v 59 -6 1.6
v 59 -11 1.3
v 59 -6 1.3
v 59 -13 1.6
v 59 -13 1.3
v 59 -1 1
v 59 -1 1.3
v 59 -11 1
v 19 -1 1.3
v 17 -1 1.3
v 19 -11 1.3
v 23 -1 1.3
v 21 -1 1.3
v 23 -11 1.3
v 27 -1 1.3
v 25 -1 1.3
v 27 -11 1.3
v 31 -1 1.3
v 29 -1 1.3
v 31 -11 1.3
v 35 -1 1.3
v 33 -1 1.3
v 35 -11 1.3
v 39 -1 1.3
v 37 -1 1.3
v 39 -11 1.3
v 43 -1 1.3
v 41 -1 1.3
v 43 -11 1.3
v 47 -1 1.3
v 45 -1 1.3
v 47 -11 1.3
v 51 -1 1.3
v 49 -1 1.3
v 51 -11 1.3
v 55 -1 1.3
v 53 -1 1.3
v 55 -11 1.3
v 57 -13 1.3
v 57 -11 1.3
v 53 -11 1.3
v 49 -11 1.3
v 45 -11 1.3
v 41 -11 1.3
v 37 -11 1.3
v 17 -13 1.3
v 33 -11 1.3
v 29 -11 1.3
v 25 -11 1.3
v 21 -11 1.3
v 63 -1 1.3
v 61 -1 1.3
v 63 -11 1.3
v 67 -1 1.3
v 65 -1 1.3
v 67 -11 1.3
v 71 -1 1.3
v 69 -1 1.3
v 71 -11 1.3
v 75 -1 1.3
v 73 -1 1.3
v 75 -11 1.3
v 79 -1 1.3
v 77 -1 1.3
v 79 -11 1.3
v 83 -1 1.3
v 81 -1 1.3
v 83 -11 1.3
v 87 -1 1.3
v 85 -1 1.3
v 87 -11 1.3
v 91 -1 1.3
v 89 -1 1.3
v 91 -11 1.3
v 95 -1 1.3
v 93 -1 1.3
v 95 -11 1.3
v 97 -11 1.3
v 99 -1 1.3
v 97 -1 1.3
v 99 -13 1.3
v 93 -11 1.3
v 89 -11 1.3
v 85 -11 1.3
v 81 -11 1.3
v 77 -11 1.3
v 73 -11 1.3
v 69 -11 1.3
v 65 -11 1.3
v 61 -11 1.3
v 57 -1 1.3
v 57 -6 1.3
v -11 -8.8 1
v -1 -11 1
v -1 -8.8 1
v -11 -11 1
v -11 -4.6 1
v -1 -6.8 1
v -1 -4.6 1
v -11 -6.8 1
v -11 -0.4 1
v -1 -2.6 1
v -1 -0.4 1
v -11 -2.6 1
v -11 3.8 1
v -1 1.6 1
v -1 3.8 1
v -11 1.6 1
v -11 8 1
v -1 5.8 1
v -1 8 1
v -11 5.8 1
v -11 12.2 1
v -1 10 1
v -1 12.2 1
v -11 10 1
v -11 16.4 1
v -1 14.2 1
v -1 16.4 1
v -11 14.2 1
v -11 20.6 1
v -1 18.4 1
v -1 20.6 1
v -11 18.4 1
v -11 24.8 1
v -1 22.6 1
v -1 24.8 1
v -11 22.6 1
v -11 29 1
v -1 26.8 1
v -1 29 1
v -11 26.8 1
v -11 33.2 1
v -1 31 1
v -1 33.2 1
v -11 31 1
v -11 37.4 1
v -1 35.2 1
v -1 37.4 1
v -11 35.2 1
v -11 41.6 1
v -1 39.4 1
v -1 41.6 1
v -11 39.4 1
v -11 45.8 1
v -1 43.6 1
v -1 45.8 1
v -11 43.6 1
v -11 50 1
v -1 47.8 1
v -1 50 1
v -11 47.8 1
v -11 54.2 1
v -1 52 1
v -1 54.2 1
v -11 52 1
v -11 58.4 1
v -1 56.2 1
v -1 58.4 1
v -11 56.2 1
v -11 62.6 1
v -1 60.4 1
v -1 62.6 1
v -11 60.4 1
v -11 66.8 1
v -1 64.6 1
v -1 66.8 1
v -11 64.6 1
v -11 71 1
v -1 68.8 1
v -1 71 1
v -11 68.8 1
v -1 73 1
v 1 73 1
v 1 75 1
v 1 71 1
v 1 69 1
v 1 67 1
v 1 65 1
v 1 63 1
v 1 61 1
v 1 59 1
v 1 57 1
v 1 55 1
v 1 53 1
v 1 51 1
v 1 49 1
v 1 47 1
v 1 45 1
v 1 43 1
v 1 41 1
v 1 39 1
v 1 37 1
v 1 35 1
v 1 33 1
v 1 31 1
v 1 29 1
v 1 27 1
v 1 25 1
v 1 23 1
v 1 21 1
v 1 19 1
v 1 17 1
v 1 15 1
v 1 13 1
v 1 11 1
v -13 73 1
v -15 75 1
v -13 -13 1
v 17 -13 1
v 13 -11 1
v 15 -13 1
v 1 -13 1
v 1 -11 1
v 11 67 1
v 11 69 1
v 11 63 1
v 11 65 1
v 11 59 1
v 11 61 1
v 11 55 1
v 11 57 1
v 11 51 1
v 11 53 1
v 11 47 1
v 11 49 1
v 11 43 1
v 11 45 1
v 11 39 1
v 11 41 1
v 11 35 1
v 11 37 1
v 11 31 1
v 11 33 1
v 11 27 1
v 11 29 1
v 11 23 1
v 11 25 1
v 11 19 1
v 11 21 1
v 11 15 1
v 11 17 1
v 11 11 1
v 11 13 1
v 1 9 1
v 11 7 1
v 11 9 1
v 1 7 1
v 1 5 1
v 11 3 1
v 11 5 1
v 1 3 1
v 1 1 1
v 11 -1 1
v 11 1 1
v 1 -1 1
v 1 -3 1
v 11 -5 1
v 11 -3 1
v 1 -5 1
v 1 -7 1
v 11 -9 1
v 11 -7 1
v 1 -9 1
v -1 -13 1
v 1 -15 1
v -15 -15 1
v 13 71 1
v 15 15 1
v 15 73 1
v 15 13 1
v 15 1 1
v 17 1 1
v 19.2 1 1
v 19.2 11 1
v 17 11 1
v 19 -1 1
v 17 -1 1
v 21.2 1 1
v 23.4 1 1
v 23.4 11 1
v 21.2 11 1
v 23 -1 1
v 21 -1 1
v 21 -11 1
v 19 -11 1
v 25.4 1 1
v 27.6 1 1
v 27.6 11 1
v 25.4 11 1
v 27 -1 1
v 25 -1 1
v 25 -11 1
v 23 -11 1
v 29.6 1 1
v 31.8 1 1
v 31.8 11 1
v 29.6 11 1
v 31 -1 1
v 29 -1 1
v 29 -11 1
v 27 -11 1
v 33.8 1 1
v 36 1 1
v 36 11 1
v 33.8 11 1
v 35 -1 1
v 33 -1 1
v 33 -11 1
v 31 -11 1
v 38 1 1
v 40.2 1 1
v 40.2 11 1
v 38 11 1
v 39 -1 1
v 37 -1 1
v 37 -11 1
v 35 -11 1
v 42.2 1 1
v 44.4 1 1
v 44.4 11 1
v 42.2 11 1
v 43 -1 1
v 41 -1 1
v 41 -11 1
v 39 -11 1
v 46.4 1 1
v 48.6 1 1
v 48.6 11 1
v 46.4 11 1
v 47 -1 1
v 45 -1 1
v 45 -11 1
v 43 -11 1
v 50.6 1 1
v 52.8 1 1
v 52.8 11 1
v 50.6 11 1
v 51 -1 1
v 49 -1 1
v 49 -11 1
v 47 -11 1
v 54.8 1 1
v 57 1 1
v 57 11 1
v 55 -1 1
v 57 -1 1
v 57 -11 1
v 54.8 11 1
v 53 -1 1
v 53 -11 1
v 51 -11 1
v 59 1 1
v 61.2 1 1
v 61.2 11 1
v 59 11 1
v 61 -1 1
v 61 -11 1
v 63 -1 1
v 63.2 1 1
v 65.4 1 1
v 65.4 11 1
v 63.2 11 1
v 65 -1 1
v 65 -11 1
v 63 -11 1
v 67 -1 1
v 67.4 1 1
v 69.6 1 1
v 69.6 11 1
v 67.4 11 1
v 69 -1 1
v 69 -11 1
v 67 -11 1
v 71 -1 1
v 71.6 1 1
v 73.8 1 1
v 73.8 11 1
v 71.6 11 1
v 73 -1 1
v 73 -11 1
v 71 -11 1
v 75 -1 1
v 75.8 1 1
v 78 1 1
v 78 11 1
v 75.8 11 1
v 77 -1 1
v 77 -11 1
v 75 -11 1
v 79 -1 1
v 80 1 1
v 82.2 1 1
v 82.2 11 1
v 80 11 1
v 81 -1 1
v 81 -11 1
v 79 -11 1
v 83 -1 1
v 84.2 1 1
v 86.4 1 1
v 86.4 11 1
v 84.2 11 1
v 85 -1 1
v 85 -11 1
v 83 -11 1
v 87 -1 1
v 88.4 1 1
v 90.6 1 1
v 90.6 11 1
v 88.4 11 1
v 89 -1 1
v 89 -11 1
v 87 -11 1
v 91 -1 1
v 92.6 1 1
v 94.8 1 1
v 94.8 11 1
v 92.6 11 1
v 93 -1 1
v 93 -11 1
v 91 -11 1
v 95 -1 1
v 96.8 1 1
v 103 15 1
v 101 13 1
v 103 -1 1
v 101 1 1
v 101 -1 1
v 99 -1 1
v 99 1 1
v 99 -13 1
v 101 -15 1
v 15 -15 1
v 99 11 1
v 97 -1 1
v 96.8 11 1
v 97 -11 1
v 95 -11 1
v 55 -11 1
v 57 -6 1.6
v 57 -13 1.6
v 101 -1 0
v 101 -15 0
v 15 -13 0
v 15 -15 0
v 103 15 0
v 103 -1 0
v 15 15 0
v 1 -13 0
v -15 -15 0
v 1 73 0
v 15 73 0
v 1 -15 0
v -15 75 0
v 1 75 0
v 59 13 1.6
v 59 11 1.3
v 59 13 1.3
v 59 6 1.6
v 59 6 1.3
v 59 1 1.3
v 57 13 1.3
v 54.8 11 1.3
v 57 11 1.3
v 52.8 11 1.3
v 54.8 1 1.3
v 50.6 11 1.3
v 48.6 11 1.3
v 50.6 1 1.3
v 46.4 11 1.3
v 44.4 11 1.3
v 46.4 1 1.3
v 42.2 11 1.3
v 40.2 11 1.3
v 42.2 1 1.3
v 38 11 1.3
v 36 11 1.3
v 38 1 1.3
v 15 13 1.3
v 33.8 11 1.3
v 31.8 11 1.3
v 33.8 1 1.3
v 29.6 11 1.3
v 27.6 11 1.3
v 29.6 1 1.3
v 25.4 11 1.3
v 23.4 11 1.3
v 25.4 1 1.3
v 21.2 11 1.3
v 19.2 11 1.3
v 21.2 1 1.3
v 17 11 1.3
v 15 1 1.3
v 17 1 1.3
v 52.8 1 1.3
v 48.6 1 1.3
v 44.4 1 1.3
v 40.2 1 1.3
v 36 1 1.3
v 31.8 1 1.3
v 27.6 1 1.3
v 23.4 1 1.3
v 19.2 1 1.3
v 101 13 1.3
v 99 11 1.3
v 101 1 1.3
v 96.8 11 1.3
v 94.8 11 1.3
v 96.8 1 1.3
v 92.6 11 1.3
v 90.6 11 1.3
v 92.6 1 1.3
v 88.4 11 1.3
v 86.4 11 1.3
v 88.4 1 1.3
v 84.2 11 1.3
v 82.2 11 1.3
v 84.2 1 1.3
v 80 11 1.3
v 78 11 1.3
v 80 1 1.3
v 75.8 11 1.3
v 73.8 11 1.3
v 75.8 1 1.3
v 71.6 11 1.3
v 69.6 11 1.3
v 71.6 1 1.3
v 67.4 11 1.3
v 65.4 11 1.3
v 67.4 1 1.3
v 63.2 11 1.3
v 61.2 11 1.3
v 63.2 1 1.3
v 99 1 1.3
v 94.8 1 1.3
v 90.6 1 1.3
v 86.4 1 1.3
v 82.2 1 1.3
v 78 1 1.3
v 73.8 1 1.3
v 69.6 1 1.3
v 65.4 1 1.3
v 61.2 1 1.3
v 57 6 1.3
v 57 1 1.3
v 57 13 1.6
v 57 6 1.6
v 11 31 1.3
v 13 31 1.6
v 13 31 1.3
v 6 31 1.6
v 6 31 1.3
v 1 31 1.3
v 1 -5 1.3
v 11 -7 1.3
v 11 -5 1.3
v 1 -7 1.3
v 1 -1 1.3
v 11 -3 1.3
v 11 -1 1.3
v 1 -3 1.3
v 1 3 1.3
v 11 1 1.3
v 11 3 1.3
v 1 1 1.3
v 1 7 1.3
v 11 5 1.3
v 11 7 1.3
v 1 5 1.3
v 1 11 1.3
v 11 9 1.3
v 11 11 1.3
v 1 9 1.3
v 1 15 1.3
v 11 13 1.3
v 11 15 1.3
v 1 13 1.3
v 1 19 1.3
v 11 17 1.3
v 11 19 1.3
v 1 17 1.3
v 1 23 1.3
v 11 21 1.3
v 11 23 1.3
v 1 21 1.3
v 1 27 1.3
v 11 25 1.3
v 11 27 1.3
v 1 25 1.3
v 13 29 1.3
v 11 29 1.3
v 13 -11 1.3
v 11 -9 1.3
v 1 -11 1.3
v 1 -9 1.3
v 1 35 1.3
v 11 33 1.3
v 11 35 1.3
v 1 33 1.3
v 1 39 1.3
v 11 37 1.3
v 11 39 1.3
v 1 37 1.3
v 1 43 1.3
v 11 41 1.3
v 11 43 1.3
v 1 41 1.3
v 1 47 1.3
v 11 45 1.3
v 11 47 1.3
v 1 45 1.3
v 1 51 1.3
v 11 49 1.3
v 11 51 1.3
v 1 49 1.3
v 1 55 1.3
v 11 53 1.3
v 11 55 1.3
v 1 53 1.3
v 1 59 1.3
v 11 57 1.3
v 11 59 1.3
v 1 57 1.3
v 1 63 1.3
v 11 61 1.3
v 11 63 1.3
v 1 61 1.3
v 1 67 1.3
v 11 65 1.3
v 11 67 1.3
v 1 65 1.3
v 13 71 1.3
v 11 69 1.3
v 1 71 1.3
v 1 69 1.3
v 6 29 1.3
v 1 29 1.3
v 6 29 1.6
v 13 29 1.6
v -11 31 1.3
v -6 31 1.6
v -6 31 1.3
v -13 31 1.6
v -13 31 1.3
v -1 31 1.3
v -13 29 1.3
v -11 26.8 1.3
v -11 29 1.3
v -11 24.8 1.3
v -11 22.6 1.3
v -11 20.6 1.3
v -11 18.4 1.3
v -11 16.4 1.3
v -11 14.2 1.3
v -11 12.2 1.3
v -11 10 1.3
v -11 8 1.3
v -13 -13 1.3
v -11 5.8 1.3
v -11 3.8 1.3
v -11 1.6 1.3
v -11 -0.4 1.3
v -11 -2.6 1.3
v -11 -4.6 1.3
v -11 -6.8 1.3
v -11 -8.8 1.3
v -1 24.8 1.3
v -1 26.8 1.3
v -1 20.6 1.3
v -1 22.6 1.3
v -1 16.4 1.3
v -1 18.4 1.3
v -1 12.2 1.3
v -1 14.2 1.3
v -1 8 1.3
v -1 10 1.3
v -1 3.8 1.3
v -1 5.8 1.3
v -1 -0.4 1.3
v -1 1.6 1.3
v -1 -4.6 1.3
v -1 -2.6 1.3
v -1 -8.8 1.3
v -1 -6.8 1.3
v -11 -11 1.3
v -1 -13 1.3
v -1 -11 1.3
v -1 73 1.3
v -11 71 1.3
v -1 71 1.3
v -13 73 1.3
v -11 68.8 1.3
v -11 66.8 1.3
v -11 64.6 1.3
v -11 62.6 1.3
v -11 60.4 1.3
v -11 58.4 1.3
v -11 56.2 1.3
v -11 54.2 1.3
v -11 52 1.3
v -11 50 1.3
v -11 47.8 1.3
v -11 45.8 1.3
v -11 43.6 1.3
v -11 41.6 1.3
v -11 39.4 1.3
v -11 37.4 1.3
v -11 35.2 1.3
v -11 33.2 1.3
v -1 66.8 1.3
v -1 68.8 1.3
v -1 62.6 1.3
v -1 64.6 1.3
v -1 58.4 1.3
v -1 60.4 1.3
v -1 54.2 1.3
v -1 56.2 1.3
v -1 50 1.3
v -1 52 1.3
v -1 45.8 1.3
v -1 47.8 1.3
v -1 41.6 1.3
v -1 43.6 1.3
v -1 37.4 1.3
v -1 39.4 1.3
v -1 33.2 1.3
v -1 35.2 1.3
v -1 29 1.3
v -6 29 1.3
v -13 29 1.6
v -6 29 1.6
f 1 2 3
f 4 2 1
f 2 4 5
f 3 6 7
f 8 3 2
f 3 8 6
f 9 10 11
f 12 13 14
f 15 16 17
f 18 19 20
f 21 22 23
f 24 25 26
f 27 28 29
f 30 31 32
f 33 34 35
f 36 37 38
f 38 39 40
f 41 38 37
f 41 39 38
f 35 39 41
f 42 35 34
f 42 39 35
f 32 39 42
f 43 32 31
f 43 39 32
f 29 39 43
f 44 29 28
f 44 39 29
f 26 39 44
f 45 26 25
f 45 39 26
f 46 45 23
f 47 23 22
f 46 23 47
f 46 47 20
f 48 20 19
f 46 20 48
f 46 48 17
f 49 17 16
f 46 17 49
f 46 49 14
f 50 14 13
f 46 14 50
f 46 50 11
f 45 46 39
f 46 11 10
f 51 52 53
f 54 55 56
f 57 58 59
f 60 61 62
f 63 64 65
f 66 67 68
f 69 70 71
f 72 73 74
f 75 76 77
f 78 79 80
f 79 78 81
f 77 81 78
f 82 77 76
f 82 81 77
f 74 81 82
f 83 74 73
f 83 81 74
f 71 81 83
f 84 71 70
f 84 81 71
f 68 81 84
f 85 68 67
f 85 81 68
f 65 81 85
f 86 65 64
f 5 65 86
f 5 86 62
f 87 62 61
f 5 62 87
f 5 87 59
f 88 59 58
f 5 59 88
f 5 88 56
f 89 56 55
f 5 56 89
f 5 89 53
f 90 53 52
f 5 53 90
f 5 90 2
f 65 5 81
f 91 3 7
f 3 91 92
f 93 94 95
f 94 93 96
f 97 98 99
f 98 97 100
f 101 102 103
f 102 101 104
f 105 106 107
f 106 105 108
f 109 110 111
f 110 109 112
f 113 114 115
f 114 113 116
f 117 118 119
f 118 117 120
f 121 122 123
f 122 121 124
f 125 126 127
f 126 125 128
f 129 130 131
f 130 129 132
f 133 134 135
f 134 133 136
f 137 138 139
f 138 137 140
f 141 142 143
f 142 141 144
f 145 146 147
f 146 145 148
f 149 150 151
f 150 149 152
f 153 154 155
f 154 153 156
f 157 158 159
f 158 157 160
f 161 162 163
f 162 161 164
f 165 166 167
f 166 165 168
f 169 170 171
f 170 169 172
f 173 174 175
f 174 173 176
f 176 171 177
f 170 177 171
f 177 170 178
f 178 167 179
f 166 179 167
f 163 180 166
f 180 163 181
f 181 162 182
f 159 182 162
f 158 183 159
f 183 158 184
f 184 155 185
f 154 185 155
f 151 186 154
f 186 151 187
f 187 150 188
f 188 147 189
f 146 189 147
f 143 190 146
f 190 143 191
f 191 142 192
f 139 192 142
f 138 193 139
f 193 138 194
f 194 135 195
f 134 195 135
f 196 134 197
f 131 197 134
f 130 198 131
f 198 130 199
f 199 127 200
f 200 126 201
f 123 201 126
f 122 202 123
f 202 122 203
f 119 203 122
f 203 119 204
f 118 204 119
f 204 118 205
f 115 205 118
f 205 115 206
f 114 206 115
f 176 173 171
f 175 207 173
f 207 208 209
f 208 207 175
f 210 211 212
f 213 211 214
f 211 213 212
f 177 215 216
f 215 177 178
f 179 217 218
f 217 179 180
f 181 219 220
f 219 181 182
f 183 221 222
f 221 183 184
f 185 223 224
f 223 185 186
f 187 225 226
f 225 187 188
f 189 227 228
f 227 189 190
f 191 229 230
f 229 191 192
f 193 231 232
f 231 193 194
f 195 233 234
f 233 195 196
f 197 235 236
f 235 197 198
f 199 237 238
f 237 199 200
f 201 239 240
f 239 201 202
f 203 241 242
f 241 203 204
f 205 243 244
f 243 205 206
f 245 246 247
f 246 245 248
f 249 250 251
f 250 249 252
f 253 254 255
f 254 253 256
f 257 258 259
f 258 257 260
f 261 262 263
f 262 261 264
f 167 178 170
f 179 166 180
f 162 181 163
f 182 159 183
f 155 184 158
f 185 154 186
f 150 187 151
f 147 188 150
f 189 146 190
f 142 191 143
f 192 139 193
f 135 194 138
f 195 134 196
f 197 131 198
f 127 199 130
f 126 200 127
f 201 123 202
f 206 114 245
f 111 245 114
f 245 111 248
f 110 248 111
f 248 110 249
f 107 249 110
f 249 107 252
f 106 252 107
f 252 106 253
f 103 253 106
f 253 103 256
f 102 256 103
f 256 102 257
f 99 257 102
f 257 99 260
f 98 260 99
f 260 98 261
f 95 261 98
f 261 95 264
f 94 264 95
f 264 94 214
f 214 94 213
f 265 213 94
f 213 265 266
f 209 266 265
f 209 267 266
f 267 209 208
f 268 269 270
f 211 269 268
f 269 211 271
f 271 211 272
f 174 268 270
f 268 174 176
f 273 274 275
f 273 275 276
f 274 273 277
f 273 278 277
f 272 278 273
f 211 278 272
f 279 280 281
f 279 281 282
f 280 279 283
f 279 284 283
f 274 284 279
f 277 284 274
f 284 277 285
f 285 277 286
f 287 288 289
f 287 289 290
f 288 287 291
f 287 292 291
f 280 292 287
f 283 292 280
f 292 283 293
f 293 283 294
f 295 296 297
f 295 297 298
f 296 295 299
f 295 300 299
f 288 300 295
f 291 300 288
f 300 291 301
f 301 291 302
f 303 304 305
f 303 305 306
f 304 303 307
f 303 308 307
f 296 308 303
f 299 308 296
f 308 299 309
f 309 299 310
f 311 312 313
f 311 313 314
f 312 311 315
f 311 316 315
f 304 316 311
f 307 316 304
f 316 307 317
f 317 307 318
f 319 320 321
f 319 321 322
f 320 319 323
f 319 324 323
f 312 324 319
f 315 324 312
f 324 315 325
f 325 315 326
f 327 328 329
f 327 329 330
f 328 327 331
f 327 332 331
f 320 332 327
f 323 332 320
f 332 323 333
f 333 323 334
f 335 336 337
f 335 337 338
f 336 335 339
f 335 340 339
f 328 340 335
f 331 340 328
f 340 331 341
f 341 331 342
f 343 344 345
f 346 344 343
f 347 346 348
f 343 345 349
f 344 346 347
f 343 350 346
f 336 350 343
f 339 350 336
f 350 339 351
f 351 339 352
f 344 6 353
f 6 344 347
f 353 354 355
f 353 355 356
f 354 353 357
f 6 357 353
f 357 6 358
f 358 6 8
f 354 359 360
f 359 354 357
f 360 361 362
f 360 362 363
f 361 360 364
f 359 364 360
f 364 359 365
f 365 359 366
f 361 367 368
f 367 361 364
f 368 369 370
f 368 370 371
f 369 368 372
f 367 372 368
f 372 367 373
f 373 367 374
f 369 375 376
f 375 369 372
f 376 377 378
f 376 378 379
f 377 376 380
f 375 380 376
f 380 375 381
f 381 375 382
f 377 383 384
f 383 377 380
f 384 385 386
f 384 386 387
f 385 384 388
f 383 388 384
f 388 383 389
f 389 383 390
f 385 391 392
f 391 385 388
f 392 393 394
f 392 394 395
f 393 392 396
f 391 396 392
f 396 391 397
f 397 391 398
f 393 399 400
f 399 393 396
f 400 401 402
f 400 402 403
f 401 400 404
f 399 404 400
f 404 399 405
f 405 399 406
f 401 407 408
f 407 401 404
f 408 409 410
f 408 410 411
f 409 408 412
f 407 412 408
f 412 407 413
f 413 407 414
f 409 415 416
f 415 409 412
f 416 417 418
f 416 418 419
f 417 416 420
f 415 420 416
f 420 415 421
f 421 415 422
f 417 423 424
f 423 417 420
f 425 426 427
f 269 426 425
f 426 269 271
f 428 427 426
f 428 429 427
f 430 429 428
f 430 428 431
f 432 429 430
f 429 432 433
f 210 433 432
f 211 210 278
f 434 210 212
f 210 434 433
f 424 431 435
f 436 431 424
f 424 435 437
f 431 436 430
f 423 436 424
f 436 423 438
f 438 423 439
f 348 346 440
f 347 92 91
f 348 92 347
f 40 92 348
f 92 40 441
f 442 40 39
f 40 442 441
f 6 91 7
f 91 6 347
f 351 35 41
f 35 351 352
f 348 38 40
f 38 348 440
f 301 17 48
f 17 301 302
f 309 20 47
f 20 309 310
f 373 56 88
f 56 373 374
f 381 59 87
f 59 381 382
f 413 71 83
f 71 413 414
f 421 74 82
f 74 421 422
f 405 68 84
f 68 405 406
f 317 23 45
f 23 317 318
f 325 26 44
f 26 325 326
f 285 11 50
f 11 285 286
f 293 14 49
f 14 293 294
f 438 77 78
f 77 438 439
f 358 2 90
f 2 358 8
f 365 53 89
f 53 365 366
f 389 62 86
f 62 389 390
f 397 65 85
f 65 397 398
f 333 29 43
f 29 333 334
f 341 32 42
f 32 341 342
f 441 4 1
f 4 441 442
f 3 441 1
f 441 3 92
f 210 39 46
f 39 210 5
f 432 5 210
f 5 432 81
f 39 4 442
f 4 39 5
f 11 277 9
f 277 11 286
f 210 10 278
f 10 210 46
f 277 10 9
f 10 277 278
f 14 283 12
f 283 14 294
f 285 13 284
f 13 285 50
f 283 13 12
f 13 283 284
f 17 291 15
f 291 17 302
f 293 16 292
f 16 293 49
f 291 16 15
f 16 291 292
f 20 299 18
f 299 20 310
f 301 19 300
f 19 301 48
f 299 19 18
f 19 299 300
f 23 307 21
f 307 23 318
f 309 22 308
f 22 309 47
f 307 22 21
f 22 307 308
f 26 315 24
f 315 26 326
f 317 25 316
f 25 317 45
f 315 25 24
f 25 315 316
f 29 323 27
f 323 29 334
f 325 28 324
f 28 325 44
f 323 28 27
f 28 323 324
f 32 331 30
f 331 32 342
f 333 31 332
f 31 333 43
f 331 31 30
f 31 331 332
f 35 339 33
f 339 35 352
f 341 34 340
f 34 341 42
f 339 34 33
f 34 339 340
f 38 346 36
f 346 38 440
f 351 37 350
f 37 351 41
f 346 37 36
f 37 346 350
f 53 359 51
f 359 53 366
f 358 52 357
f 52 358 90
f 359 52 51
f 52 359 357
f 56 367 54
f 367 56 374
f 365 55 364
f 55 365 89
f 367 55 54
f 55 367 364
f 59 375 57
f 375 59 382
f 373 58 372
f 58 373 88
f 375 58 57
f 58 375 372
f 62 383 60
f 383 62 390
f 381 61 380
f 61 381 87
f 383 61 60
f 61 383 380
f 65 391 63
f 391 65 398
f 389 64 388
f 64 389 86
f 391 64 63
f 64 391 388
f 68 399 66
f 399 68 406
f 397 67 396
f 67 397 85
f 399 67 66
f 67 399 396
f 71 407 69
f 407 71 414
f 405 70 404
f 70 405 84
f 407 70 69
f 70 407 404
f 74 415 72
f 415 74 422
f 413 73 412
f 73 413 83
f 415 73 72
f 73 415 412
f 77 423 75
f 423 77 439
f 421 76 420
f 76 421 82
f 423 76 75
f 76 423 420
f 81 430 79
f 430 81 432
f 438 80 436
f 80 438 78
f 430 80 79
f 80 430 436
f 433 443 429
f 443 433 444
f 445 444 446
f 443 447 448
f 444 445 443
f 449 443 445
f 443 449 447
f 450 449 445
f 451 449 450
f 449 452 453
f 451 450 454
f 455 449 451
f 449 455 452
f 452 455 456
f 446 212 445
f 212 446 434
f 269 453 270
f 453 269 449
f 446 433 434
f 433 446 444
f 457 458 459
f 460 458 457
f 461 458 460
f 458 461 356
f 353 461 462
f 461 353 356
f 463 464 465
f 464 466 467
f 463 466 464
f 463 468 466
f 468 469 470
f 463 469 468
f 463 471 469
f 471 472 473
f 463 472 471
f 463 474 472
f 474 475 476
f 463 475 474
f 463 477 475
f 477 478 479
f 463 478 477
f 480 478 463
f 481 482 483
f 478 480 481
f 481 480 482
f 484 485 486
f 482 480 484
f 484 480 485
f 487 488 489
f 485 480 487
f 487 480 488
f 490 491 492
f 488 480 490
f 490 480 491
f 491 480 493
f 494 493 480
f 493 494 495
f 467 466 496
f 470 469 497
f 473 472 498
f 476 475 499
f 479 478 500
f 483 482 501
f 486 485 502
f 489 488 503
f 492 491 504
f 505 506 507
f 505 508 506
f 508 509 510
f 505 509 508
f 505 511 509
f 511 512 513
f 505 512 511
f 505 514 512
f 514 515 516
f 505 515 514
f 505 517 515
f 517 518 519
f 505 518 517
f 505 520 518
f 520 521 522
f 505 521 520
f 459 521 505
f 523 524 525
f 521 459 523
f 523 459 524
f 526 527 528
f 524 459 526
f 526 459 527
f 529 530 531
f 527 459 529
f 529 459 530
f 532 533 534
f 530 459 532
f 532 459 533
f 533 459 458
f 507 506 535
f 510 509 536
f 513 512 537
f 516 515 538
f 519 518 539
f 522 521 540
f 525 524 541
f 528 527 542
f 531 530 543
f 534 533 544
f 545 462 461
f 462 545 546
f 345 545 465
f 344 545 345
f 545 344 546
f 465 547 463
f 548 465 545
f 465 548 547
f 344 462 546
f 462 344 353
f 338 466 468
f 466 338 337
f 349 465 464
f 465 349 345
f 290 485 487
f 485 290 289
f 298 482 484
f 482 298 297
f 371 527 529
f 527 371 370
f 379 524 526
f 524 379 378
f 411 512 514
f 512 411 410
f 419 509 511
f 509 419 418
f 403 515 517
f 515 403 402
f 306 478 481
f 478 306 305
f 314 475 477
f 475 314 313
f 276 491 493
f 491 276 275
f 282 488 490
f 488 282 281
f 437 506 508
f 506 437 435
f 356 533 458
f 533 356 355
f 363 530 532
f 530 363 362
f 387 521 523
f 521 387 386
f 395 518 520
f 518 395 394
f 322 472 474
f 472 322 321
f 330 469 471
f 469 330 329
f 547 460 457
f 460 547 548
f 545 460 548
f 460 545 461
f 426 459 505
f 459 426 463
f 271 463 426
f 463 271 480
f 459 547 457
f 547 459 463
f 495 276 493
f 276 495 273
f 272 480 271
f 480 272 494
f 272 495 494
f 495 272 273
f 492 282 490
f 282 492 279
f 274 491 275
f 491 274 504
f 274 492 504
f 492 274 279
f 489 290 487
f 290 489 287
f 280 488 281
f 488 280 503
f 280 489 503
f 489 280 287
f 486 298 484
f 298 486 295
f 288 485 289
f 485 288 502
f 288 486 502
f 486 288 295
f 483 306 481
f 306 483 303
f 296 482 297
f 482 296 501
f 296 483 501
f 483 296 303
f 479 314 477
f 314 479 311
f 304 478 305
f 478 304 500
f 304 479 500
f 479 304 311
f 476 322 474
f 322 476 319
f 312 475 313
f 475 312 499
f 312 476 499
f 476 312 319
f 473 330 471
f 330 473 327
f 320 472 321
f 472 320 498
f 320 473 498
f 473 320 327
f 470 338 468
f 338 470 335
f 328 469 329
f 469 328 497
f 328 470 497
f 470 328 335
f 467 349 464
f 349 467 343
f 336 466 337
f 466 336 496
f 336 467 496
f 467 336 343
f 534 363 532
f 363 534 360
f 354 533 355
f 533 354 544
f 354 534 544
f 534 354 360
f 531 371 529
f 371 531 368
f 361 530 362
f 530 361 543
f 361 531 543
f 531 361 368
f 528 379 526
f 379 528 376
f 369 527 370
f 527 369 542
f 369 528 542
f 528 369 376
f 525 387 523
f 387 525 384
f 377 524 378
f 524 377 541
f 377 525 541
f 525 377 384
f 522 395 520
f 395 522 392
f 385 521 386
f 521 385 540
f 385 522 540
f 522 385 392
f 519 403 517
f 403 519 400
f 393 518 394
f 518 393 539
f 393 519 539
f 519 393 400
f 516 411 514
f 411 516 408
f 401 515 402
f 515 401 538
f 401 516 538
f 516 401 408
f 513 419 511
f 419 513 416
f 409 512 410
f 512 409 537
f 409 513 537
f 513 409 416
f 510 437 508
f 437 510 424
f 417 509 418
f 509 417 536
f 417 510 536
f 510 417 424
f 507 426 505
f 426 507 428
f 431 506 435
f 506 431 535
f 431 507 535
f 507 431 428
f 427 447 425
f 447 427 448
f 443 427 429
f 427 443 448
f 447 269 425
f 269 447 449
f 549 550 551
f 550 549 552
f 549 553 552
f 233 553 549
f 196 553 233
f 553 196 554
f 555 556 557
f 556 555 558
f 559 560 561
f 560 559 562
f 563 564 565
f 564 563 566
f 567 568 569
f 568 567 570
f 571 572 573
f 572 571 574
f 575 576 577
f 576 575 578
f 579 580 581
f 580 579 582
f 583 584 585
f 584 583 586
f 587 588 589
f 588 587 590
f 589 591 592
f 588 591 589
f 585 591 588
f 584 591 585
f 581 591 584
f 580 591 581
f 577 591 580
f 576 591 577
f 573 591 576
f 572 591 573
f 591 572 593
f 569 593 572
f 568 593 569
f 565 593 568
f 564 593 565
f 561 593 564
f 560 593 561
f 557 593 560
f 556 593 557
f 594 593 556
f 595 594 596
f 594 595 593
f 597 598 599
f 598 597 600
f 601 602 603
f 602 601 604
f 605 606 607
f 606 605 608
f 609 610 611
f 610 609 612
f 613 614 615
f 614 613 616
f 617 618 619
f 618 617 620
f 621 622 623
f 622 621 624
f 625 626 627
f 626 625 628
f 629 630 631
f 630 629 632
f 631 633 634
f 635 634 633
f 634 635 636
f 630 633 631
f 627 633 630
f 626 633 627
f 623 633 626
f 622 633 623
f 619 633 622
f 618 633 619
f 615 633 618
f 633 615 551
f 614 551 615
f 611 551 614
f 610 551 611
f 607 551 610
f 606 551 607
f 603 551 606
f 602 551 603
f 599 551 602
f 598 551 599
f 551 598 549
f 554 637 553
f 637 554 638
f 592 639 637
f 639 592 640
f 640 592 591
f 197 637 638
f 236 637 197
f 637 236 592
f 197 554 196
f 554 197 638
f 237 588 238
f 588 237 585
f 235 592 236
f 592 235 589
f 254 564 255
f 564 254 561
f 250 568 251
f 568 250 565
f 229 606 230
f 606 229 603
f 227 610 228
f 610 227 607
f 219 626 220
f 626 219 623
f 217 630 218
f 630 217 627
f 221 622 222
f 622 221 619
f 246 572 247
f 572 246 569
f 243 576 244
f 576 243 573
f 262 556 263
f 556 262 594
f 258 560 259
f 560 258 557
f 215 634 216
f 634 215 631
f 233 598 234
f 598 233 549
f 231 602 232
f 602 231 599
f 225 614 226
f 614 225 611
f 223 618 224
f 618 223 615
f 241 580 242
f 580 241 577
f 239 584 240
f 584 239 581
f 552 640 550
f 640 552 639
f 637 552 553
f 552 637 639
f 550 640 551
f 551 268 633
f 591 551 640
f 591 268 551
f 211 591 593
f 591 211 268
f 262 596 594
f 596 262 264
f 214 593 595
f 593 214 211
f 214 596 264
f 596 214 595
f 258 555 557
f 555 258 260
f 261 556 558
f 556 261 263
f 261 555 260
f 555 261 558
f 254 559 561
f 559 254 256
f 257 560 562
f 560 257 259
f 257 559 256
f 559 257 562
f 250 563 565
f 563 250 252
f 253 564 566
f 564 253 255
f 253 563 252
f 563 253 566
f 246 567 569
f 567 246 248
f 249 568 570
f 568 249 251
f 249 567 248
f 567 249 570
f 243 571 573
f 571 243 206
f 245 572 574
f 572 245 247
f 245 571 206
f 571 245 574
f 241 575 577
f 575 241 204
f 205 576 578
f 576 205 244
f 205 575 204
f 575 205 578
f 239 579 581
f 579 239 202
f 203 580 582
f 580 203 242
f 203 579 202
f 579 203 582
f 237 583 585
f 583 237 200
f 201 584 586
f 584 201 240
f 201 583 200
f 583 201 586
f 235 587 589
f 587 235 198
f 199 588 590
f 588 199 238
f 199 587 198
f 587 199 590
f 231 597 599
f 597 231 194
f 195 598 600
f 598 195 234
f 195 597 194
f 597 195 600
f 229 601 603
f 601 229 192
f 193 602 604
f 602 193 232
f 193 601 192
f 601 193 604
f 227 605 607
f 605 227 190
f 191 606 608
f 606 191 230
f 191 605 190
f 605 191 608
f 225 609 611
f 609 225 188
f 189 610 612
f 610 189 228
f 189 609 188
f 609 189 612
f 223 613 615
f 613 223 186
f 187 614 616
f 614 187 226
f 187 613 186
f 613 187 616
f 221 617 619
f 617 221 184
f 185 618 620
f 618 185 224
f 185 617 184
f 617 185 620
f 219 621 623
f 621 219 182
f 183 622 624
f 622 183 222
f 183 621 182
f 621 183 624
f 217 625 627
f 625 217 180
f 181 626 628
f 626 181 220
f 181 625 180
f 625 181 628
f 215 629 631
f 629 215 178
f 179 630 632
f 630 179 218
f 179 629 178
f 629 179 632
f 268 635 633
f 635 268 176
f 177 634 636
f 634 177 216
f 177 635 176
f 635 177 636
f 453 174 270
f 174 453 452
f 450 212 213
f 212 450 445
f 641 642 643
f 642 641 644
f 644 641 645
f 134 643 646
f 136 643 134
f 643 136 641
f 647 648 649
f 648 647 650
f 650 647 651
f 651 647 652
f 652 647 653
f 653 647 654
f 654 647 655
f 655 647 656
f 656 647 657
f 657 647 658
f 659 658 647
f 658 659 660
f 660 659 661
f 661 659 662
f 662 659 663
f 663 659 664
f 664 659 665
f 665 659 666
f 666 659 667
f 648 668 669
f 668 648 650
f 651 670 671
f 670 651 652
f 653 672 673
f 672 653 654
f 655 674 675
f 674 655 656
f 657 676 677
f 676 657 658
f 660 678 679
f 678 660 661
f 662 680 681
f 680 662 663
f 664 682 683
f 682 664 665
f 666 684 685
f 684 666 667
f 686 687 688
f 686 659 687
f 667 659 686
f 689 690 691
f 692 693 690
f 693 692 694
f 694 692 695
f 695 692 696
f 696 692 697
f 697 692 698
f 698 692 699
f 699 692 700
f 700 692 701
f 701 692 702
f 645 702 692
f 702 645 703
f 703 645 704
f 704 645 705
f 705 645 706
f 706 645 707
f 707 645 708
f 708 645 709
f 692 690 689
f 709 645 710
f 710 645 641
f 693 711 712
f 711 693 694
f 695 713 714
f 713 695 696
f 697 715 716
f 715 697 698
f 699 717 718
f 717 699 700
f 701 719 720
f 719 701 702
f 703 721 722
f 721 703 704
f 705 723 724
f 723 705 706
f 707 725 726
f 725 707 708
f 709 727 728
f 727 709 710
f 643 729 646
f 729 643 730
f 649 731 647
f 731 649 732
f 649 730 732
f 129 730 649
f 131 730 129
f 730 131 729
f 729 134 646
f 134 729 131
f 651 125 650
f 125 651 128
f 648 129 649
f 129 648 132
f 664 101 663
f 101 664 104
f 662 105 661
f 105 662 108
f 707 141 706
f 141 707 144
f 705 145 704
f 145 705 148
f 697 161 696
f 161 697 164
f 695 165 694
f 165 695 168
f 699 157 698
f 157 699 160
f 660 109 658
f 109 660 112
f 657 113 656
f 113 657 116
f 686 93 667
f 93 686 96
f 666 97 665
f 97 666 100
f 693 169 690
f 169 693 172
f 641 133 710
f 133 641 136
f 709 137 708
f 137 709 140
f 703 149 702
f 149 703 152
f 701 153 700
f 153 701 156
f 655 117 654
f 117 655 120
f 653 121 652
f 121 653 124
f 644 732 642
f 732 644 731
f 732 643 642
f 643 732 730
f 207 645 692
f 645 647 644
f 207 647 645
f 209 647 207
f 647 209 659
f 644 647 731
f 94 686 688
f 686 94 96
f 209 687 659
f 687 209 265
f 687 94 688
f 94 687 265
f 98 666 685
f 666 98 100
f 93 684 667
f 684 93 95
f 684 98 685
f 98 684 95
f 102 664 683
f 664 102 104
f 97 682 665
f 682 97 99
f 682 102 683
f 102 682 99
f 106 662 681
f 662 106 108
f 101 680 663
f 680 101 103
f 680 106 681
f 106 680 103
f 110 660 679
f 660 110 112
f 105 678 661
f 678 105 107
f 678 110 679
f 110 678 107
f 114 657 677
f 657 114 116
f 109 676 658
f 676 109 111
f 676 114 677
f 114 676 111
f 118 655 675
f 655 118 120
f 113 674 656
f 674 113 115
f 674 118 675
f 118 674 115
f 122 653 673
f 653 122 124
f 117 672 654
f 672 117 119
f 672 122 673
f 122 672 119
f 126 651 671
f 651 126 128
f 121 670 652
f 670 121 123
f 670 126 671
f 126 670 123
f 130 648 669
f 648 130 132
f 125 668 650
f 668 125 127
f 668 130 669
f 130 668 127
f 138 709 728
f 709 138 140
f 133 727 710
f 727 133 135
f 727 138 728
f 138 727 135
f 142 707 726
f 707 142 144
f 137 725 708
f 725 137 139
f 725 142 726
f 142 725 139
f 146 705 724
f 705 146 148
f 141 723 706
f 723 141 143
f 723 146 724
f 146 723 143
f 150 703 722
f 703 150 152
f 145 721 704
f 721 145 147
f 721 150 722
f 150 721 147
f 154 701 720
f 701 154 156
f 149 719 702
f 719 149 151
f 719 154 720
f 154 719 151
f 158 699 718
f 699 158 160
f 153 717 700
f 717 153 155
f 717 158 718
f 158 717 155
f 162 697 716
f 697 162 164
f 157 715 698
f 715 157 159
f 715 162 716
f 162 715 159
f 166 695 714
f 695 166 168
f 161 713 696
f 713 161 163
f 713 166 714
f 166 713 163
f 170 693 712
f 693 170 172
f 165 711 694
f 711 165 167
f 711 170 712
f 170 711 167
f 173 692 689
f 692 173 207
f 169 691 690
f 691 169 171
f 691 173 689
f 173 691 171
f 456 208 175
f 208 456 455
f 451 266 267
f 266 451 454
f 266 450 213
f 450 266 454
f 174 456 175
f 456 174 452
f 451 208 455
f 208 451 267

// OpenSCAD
/**
 *
 * Run:
 *
 *    openscad <file_name>.scad
 *    openscad [options] <file_name>.scad
 *
 * Options with -D <var=val>:
 * 
 *    teeth_count      number of teeth, recommended: 10 for positive offset + 10 for negative offset + 1 center = 21
 *    tooth_width      width of one single tooth
 *    tooth_height     height of teeth / comb, should be n * layer_height
 *    tooth_length     length of one single tooth
 *    teeth_gap        space in between teeth of the unscaled comb
 *    comb_clearance   comb to comb distance, should not be > (2 * tooth_width)
 *    base_height      comb base (optional), set to 0 to disable
 *    render_mode      0 ... all, 1 ... verification comb + base, 2 ... alignment comb
 *    extra_clearance  deprecated: extra clearance in case the comb pairs overlap (usually on small twidth and/or tgap)
 * 
 */

// ------------------------------------------------------------------------------------------------------------------------

module drawComb (
    _num_teeth, 
    _teeth_gap,
    _tooth_width,
    _tooth_height,
    _tooth_length,
    _base_height,
    _render_mode) // 3 ... none, 4 ... bed only, 5 ... comb only, 6 ... all
{
  
  // base for better adhesion (optional)
  if (_base_height > 0 && (_render_mode == 4 || _render_mode == 6)) 
  {
    _comb_length = (_num_teeth - 1) * _teeth_gap + (_num_teeth + 2) * _tooth_width;
    _comb_width  =  _tooth_width + _tooth_length + 2 * _tooth_width;
    
    color("grey")
      translate ([-_tooth_width, -2*_tooth_width, 0])
        cube([_comb_length, _comb_width, _base_height]);
  }

  // comb
  if (_render_mode == 5 || _render_mode == 6) 
  {
    color_value = _render_mode == 1 ? "blue": (_render_mode == 2 ? "red" : "orange");

    union() 
    {
      // teeth
      for (t = [0:_num_teeth-1]) 
      {
        let (translation = [t * (_teeth_gap + _tooth_width), 0, _base_height])
        {
          translate (translation) color(color_value) cube ([_tooth_width, _tooth_length, _tooth_height], false);
          
          // center tooth mark
          if (t == (((_num_teeth - 1) / 2)))
          {
            translate (translation + [0, -_tooth_width, _tooth_height]) color(color_value) cube ([_tooth_width, _tooth_length / 2 + _tooth_width, _tooth_height]);
          }
        }
      }
      
      // comb back
      translate ([0, - _tooth_width, _base_height]) 
        color(color_value) 
          cube ([_num_teeth * _tooth_width + (_num_teeth - 1) * _teeth_gap, _tooth_width, _tooth_height], false);      
    }
  }
}

// ------------------------------------------------------------------------------------------------------------------------

module drawCombPair(
    _teeth_count, 
    _teeth_gap,
    _tooth_width,
    _tooth_height,
    _tooth_length,
    _comb_clearance,
    _base_height,
    _render_mode) 
{
  _comb_displacement = [0, -_tooth_length - (_comb_clearance / 2), 0];
  _second_comb_teeth_displacement = _teeth_gap / ((_teeth_count - 1) / 2);
  _second_comb_teeth_gap = _teeth_gap + _second_comb_teeth_displacement;
  _second_comb_displacement = [-_teeth_gap, 0 , 0];

  // default comb
    translate(_comb_displacement)
      drawComb(_teeth_count, _teeth_gap, _tooth_width, _tooth_height, _tooth_length, _base_height,  
        _render_mode == 0 ? 6 :             // all
          (_render_mode == 2 ? 5 :          // comb only
            (_render_mode == 1 ? 4 : 3)));  // bed only

  // verification comb (stretched)
    mirror ([0,1,0]) 
      translate (_second_comb_displacement) // sync middle tooth with default comb 
        translate(_comb_displacement)
          drawComb(_teeth_count, _second_comb_teeth_gap, _tooth_width, _tooth_height, _tooth_length, _base_height, 
            _render_mode == 0 ? 6 :          // all
              (_render_mode == 1 ? 6 : 3));  // comb and bed
}

// ------------------------------------------------------------------------------------------------------------------------

module drawXYCalibrationCombs( 
    _teeth_count, 
    _teeth_gap,
    _tooth_width,
    _tooth_height,
    _tooth_length,
    _comb_clearance,
    _base_height,
    _render_mode,
    _extra_clearance) 
{
  _comb_width = _tooth_length + _tooth_width + _comb_clearance / 2;
  _t_x = [_comb_width + 2 * _tooth_width + _extra_clearance , 0, 0];
  _t_y = [0, -_comb_width + _tooth_width, 0];
  _r_y = [0, 0, 90];
  
  // X aligned comb pair
  translate(_t_x)
    drawCombPair(_teeth_count, _teeth_gap, _tooth_width, _tooth_height, _tooth_length, _comb_clearance, _base_height, _render_mode);

  // Y aligned comb pair
  translate(_t_y)
    rotate(_r_y) 
      drawCombPair(_teeth_count, _teeth_gap, _tooth_width, _tooth_height, _tooth_length, _comb_clearance, _base_height, _render_mode); 
}

// ------------------------------------------------------------------------------------------------------------------------

module draw()
{
  teeth_count    = is_undef(teeth_count)    ?  21 : teeth_count;     // number of teeth, recommended: 10 for positive offset + 10 for negative offset + 1 center = 21
  tooth_width    = is_undef(tooth_width)    ?   2 : tooth_width;     // width of one single tooth
  tooth_height   = is_undef(tooth_height)   ? 0.3 : tooth_height;    // height of teeth / comb, should be n * layer_height
  tooth_length   = is_undef(tooth_length)   ?  10 : tooth_length;    // length of one single tooth
  teeth_gap      = is_undef(teeth_gap)      ?   2 : teeth_gap;       // space in between teeth of the unscaled comb
  comb_clearance = is_undef(comb_clearance) ?   2 : comb_clearance;  // comb to comb distance, should not be > (2 * tooth_width)
  base_height    = is_undef(base_height)    ?   1 : base_height;     // comb base (optional), set to 0 to disable
  render_mode    = is_undef(render_mode)    ?   0 : render_mode;     // 0 ... all, 1 ... verification comb + base, 2 ... alignment comb; (>= 3 ... reserved for internal usage)
  
  // TODO rr - remove the need of the extra_clearance parameter: swap draw order (draw verification comb first, then align the default one)
  extra_clearance = is_undef(extra_clearance) ? 0 : extra_clearance; // extra clearance in case the comb pairs overlap (usually on small twidth and/or tgap)
  
  assert(teeth_count % 2 == 1, "An odd number of teeth is required.");
  drawXYCalibrationCombs(teeth_count, teeth_gap, tooth_width, tooth_height, tooth_length, comb_clearance, base_height, render_mode, extra_clearance);
}

// ------------------------------------------------------------------------------------------------------------------------

draw();
